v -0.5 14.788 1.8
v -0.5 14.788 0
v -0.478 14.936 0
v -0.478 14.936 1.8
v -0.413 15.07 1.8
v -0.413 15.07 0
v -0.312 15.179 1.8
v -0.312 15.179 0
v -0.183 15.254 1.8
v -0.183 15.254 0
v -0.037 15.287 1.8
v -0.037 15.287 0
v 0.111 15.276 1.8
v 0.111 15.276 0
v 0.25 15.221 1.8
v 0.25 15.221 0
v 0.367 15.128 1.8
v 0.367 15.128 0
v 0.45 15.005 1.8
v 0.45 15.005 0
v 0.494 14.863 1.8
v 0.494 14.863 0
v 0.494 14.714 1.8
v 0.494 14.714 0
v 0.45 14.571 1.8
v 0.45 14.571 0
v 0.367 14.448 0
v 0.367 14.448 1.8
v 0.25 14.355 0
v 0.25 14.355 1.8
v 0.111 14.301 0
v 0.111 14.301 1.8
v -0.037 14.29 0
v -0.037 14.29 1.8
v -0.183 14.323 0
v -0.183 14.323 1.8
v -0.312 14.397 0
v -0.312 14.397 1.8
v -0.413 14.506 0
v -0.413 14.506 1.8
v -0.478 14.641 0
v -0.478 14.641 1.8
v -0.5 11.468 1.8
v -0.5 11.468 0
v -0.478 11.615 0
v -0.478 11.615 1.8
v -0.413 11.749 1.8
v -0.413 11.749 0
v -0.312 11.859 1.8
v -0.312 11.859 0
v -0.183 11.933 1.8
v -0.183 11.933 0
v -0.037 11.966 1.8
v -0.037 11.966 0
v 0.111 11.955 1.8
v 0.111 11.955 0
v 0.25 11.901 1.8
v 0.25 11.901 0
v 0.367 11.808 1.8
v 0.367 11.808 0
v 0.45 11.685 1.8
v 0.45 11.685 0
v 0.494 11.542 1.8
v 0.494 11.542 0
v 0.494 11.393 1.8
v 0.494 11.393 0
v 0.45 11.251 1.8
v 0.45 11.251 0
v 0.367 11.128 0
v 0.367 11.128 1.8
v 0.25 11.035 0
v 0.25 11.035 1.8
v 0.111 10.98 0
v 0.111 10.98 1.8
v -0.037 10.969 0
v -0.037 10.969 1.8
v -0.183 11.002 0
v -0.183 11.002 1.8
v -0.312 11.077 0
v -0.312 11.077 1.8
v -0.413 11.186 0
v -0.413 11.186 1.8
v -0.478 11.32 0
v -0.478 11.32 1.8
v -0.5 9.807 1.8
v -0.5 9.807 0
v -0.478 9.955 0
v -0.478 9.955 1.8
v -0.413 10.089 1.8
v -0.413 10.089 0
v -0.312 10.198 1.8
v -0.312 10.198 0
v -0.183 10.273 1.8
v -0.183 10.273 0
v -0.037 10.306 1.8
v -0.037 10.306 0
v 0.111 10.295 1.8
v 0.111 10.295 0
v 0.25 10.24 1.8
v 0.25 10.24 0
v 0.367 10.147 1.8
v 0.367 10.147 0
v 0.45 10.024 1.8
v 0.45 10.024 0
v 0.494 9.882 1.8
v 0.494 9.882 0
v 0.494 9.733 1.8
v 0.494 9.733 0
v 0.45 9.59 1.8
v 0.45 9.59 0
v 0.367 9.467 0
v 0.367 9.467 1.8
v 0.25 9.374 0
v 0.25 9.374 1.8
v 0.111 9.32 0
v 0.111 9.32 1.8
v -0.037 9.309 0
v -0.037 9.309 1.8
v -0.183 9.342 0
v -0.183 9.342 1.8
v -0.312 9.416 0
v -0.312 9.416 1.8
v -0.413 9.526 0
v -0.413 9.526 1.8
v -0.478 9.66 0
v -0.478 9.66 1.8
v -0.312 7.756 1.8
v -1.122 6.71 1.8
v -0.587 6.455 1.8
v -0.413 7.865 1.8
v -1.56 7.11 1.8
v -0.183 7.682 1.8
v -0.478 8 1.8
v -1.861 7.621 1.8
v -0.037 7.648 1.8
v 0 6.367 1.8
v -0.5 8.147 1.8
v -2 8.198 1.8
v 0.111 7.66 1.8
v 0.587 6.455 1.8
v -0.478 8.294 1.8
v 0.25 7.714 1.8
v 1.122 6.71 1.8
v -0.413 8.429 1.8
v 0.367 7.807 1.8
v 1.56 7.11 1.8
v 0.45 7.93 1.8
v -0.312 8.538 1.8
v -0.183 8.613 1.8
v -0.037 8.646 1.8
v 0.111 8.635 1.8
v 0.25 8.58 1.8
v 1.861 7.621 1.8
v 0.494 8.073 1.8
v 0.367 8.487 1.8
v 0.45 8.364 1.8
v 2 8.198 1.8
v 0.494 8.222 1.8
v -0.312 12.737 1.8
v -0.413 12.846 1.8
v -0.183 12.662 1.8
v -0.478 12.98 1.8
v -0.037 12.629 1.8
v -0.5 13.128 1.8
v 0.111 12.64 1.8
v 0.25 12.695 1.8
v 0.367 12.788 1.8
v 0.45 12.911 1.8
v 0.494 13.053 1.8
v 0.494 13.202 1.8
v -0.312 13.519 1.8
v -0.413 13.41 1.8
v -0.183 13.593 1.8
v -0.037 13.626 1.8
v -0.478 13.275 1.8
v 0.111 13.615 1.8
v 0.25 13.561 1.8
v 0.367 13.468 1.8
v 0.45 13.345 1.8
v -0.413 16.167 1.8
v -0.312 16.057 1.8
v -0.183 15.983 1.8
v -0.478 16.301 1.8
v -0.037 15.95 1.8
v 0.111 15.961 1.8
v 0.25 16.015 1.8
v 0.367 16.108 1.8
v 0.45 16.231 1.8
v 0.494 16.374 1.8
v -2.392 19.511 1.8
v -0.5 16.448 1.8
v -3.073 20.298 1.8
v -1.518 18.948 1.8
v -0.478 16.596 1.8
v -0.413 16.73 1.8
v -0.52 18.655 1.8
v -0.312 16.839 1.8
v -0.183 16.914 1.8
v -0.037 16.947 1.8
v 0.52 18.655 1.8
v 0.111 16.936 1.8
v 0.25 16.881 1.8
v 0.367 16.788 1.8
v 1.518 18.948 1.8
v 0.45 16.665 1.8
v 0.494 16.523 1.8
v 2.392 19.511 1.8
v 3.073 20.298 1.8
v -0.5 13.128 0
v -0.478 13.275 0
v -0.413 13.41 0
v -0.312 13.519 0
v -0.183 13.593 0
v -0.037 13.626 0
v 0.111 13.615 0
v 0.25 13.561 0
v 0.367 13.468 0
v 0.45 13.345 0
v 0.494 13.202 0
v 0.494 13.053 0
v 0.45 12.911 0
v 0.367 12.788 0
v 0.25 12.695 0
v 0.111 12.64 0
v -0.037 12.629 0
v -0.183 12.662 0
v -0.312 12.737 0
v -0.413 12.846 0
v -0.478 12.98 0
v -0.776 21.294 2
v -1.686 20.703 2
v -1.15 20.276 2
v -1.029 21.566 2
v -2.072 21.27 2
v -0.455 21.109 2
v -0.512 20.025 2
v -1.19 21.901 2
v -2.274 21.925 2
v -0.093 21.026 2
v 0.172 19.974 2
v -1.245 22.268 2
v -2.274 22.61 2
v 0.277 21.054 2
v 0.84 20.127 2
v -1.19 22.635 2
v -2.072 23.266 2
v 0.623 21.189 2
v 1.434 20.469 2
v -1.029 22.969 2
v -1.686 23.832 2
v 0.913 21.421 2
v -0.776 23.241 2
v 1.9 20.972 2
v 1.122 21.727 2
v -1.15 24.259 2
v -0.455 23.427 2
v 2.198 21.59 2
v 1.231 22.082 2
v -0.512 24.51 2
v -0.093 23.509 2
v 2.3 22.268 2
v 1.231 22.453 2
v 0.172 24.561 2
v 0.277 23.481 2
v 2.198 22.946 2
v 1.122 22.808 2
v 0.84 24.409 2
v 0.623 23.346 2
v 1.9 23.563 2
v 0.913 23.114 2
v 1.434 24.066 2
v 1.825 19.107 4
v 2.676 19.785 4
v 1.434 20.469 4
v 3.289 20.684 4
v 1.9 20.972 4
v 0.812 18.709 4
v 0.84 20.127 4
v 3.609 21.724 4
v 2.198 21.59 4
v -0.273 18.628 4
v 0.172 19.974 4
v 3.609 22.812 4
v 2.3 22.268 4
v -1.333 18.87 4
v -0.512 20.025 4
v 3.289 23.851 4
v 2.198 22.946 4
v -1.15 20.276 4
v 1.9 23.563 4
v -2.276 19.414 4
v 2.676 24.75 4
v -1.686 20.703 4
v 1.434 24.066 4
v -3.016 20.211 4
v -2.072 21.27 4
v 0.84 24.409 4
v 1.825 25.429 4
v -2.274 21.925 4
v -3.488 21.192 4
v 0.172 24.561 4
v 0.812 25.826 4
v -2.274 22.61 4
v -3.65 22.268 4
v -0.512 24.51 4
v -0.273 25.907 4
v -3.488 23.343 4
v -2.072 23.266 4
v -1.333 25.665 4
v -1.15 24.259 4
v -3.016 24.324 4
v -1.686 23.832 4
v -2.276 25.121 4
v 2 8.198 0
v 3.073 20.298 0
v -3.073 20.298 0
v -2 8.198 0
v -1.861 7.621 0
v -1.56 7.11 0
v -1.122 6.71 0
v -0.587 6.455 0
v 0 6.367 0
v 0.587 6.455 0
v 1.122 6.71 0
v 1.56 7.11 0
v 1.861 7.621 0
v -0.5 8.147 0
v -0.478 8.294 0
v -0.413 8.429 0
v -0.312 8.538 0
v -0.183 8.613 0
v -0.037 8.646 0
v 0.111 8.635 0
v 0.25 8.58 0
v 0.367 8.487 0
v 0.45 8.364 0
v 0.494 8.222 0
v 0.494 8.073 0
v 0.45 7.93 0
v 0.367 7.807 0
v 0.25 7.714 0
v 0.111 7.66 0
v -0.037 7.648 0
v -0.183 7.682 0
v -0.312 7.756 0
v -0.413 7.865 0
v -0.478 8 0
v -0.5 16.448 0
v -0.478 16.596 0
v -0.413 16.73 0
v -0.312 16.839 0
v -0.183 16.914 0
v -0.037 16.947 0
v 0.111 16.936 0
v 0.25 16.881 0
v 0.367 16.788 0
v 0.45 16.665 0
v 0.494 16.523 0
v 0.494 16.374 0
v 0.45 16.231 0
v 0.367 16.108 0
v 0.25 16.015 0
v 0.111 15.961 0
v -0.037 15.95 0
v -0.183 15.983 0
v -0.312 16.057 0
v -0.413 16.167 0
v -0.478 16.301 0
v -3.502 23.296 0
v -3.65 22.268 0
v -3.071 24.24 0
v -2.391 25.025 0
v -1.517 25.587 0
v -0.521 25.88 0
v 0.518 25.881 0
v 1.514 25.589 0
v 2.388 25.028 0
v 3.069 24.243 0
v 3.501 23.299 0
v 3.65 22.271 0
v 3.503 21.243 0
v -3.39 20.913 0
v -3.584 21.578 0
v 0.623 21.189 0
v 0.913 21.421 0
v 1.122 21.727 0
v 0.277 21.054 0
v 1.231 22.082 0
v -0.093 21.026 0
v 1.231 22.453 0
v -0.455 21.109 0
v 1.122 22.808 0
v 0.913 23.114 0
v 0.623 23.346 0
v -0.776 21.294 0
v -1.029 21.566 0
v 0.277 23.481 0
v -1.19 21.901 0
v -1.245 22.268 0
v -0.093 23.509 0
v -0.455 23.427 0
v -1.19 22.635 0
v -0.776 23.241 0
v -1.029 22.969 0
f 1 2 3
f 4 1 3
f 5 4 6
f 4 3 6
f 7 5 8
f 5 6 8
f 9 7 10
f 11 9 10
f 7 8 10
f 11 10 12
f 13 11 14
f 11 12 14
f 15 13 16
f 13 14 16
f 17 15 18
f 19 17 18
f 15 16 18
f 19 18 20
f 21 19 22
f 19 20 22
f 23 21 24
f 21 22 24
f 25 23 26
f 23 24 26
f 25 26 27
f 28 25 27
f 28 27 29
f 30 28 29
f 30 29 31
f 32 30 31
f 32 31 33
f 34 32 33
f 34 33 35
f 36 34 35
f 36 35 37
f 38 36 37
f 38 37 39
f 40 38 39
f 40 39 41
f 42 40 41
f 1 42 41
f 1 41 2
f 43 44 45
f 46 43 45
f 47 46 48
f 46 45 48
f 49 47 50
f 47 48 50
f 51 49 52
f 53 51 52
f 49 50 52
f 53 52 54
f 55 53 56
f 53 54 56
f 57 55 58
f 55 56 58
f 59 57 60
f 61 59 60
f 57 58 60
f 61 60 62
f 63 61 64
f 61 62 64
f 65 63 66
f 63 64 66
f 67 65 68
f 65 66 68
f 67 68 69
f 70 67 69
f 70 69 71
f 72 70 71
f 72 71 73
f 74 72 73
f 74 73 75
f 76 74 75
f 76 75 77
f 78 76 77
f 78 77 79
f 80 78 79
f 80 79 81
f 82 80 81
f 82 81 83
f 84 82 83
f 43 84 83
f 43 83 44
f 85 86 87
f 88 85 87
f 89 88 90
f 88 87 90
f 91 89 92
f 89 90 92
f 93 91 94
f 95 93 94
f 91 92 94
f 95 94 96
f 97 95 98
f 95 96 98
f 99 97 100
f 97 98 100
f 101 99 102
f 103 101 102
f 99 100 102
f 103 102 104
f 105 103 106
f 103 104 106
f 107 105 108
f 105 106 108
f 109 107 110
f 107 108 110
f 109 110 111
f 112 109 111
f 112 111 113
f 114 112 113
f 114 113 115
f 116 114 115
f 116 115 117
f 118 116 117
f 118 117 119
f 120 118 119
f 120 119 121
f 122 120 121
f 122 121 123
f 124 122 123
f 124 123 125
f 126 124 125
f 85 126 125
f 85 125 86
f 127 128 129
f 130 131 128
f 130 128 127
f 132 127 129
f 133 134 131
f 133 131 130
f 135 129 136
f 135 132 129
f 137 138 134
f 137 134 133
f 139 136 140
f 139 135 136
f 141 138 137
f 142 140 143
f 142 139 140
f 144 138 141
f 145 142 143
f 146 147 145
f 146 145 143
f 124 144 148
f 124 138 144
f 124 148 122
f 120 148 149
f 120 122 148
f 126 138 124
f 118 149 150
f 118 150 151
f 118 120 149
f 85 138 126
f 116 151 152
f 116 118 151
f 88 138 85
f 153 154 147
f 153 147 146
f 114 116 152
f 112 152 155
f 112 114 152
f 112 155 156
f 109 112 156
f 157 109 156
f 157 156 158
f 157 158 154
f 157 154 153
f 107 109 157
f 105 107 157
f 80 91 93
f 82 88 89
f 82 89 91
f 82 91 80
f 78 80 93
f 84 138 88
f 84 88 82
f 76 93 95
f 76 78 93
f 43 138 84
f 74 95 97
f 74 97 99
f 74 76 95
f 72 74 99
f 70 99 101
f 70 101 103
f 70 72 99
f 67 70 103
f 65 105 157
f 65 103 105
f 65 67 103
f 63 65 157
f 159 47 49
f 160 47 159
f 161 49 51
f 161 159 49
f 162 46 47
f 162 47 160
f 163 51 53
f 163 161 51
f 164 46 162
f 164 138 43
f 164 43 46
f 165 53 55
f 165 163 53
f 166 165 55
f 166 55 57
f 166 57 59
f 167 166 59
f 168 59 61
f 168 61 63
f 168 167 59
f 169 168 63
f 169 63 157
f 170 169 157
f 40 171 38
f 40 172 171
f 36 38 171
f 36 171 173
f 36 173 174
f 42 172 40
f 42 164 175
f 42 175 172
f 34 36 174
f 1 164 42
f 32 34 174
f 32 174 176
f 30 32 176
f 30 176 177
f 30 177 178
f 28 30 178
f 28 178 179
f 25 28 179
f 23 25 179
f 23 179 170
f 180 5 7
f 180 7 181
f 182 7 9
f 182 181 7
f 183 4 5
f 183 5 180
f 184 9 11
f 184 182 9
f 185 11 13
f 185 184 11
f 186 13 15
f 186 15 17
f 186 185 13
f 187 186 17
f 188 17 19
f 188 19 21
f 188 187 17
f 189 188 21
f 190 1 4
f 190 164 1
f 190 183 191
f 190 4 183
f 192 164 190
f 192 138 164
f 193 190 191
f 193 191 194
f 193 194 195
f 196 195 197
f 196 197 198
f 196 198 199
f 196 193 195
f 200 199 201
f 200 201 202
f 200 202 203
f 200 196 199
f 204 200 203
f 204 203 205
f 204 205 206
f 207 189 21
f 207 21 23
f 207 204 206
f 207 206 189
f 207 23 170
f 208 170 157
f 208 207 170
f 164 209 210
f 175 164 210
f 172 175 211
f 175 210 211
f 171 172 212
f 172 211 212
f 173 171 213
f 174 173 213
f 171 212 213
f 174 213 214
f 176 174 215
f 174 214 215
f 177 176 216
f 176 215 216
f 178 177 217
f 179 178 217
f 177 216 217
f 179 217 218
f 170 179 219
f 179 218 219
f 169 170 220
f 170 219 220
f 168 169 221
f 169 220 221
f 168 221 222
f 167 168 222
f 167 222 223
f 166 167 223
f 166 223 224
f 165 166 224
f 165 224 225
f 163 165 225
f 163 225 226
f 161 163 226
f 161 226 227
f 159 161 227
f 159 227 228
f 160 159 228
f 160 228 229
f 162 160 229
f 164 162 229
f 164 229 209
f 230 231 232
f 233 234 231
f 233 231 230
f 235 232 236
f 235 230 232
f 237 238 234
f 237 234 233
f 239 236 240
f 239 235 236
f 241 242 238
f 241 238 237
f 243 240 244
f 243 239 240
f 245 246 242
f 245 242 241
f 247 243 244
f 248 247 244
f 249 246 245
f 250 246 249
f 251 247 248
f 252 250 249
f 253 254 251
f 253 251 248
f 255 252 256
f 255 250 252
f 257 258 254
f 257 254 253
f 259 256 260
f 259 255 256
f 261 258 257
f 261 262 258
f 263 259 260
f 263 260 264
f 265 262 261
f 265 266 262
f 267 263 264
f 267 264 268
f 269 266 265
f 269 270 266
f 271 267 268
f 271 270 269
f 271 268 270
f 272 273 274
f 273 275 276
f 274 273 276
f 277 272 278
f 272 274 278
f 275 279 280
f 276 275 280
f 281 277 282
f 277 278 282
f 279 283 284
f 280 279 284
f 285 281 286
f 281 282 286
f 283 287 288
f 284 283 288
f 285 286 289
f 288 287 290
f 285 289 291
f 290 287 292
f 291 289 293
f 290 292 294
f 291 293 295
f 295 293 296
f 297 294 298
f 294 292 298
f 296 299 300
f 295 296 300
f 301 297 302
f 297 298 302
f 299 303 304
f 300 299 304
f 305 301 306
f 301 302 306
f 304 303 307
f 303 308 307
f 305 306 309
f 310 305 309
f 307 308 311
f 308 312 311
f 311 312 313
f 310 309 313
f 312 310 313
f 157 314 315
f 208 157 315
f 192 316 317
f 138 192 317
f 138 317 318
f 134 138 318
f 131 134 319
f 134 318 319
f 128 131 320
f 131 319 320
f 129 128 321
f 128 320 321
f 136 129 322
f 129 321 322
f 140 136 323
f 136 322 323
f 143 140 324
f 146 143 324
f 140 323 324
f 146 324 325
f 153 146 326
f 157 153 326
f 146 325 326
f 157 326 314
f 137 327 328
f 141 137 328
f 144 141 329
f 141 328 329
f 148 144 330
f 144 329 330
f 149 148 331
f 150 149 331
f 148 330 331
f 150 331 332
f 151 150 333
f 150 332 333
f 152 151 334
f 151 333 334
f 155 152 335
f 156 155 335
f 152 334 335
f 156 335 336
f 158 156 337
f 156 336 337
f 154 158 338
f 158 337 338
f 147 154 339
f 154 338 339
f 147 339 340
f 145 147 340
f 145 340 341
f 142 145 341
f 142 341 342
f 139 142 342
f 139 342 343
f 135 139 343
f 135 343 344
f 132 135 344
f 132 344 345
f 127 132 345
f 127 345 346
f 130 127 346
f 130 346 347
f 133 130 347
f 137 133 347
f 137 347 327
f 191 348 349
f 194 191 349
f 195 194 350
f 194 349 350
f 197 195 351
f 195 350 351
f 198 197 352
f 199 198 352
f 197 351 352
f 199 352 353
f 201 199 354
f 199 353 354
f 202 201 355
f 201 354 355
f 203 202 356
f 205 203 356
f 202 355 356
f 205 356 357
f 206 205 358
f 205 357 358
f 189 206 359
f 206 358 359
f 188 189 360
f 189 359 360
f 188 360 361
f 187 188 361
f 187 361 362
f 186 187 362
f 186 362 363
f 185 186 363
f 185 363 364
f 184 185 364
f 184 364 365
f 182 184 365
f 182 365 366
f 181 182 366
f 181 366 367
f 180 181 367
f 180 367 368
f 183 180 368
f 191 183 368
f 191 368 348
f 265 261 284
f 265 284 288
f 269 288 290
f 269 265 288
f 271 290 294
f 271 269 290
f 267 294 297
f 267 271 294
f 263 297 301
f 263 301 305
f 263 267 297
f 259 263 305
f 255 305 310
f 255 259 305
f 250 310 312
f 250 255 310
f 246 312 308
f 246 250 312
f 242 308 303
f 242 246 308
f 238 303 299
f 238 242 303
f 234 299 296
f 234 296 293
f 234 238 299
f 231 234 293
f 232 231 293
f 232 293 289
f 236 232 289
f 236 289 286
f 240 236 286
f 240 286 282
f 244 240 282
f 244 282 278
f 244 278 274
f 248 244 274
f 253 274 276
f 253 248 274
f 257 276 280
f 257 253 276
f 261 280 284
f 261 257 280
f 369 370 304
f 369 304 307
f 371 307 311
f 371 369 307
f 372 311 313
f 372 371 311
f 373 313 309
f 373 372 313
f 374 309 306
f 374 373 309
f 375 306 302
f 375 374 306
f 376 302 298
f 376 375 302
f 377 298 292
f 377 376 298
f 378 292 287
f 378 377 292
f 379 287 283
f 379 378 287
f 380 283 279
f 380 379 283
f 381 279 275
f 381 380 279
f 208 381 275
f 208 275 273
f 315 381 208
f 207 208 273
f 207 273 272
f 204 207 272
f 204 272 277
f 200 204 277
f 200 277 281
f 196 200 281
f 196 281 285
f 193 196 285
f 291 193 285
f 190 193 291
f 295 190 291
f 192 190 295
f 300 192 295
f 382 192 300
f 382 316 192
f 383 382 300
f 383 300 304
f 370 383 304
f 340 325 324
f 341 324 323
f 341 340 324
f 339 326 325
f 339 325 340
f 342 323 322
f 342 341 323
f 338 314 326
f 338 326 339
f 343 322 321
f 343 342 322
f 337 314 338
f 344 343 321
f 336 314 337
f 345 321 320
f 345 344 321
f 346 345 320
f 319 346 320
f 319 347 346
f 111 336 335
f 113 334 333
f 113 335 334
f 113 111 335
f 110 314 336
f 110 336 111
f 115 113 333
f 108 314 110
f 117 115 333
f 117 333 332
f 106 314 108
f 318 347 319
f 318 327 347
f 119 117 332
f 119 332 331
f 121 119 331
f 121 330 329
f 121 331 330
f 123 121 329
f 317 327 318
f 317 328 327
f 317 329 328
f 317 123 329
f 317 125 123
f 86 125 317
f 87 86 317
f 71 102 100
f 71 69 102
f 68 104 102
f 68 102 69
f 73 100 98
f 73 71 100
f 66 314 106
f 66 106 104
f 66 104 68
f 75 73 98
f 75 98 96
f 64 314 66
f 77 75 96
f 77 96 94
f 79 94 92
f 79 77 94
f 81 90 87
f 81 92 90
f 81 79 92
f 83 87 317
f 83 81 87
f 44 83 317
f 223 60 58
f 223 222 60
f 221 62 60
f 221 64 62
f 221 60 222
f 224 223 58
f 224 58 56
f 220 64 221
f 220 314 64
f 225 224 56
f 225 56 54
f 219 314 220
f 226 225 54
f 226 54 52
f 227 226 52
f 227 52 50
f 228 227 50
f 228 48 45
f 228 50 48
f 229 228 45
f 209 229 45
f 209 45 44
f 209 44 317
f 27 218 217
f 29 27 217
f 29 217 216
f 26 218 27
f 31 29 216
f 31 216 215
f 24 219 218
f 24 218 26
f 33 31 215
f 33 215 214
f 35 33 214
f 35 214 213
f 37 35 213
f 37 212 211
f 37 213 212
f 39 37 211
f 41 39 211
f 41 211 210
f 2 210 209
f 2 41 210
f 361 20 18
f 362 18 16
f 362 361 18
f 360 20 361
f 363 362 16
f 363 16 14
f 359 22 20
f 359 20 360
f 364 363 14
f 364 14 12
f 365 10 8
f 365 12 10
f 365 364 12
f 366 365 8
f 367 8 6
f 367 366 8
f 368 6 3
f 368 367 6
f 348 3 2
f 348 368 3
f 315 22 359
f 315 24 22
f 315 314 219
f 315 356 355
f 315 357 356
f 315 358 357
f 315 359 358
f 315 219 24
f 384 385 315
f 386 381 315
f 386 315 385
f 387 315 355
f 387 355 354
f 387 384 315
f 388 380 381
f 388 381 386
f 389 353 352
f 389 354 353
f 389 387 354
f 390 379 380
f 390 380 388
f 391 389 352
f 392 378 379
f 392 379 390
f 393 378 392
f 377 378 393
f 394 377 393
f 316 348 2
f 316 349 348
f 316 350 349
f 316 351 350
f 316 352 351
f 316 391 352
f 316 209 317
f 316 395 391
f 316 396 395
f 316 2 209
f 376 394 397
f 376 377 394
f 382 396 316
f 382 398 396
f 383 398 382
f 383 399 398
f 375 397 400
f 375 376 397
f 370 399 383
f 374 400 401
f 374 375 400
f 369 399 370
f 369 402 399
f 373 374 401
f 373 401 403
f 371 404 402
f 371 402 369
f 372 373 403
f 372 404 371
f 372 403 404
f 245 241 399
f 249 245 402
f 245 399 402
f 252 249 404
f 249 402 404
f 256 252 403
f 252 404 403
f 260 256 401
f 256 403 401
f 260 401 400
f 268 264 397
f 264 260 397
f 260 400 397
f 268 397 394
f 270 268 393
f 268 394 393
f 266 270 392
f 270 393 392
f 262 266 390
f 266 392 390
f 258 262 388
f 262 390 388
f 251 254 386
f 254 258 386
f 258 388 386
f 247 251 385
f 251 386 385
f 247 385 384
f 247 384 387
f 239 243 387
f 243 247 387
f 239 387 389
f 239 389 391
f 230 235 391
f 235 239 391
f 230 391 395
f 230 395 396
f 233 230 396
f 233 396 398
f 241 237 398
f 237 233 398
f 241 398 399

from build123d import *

# Parameters (mm, degrees)
RESSALTO_EXTRUS_O1_DEPTH  = 1.8
ESBO_O2_R                 = 3.65
ESBO_O2_R_2               = 1.245
RESSALTO_EXTRUS_O2_DEPTH  = 4
CORTE_EXTRUS_O1_START     = -2
ESBO_O3_R                 = 2.3
ESBO_O3_R_2               = 1.245
CORTE_EXTRUS_O1_DEPTH     = 2
FURO_COM_FOLGA_DE_00001_D = 0.899999978
FURO_COM_FOLGA_DE_00002_D = 1.000000032


with BuildPart() as part:
    # Esboço1 → Ressalto-extrusão1 (new body)
    with BuildSketch(Plane.XY):
        with BuildLine():
            Line((2, 8.197608696), (3.072718666, 20.297608696))
            ThreePointArc((3.072718666, 20.297608696), (0, 18.617608696), (-3.072718666, 20.297608696))
            Line((-3.072718666, 20.297608696), (-2, 8.197608696))
            ThreePointArc((-2, 8.197608696), (0, 6.36707334), (2, 8.197608696))
        make_face()
    extrude(amount=RESSALTO_EXTRUS_O1_DEPTH)

    # Esboço2 → Ressalto-extrusão2 (add)
    with BuildSketch(Plane(origin=(0, 0, 0), x_dir=(-1, 0, 0), z_dir=(0, 0, -1))):
        with Locations((0, 22.267608696)):
            Circle(ESBO_O2_R)
        with Locations((0, 22.267608696)):
            Circle(ESBO_O2_R_2, mode=Mode.SUBTRACT)
    extrude(amount=-RESSALTO_EXTRUS_O2_DEPTH)

    # Esboço3 → Corte-extrusão1 (cut)
    with BuildSketch(Plane.XY.offset(4).offset(CORTE_EXTRUS_O1_START)):
        with Locations((0, 22.267608696)):
            Circle(ESBO_O3_R)
        with Locations(Location((0, 22.267608696, 0), (0, 0, 180))):
            Circle(ESBO_O3_R_2, mode=Mode.SUBTRACT)
    extrude(amount=CORTE_EXTRUS_O1_DEPTH, mode=Mode.SUBTRACT)

    # Furo com folga de #00001 (through all)
    with Locations(Plane.XY.offset(1.8)):
        with Locations((0, 8.14707334)):
            Hole(FURO_COM_FOLGA_DE_00001_D / 2)

    # Furo com folga de #00002 (through all)
    with Locations(Plane.XY.offset(1.8)):
        with Locations((0, 8.14707334), (0, 9.807341018), (0, 11.467608696), (0, 13.127876373), (0, 14.788144051), (0, 16.448411729)):
            Hole(FURO_COM_FOLGA_DE_00002_D / 2)


solid = part.part
